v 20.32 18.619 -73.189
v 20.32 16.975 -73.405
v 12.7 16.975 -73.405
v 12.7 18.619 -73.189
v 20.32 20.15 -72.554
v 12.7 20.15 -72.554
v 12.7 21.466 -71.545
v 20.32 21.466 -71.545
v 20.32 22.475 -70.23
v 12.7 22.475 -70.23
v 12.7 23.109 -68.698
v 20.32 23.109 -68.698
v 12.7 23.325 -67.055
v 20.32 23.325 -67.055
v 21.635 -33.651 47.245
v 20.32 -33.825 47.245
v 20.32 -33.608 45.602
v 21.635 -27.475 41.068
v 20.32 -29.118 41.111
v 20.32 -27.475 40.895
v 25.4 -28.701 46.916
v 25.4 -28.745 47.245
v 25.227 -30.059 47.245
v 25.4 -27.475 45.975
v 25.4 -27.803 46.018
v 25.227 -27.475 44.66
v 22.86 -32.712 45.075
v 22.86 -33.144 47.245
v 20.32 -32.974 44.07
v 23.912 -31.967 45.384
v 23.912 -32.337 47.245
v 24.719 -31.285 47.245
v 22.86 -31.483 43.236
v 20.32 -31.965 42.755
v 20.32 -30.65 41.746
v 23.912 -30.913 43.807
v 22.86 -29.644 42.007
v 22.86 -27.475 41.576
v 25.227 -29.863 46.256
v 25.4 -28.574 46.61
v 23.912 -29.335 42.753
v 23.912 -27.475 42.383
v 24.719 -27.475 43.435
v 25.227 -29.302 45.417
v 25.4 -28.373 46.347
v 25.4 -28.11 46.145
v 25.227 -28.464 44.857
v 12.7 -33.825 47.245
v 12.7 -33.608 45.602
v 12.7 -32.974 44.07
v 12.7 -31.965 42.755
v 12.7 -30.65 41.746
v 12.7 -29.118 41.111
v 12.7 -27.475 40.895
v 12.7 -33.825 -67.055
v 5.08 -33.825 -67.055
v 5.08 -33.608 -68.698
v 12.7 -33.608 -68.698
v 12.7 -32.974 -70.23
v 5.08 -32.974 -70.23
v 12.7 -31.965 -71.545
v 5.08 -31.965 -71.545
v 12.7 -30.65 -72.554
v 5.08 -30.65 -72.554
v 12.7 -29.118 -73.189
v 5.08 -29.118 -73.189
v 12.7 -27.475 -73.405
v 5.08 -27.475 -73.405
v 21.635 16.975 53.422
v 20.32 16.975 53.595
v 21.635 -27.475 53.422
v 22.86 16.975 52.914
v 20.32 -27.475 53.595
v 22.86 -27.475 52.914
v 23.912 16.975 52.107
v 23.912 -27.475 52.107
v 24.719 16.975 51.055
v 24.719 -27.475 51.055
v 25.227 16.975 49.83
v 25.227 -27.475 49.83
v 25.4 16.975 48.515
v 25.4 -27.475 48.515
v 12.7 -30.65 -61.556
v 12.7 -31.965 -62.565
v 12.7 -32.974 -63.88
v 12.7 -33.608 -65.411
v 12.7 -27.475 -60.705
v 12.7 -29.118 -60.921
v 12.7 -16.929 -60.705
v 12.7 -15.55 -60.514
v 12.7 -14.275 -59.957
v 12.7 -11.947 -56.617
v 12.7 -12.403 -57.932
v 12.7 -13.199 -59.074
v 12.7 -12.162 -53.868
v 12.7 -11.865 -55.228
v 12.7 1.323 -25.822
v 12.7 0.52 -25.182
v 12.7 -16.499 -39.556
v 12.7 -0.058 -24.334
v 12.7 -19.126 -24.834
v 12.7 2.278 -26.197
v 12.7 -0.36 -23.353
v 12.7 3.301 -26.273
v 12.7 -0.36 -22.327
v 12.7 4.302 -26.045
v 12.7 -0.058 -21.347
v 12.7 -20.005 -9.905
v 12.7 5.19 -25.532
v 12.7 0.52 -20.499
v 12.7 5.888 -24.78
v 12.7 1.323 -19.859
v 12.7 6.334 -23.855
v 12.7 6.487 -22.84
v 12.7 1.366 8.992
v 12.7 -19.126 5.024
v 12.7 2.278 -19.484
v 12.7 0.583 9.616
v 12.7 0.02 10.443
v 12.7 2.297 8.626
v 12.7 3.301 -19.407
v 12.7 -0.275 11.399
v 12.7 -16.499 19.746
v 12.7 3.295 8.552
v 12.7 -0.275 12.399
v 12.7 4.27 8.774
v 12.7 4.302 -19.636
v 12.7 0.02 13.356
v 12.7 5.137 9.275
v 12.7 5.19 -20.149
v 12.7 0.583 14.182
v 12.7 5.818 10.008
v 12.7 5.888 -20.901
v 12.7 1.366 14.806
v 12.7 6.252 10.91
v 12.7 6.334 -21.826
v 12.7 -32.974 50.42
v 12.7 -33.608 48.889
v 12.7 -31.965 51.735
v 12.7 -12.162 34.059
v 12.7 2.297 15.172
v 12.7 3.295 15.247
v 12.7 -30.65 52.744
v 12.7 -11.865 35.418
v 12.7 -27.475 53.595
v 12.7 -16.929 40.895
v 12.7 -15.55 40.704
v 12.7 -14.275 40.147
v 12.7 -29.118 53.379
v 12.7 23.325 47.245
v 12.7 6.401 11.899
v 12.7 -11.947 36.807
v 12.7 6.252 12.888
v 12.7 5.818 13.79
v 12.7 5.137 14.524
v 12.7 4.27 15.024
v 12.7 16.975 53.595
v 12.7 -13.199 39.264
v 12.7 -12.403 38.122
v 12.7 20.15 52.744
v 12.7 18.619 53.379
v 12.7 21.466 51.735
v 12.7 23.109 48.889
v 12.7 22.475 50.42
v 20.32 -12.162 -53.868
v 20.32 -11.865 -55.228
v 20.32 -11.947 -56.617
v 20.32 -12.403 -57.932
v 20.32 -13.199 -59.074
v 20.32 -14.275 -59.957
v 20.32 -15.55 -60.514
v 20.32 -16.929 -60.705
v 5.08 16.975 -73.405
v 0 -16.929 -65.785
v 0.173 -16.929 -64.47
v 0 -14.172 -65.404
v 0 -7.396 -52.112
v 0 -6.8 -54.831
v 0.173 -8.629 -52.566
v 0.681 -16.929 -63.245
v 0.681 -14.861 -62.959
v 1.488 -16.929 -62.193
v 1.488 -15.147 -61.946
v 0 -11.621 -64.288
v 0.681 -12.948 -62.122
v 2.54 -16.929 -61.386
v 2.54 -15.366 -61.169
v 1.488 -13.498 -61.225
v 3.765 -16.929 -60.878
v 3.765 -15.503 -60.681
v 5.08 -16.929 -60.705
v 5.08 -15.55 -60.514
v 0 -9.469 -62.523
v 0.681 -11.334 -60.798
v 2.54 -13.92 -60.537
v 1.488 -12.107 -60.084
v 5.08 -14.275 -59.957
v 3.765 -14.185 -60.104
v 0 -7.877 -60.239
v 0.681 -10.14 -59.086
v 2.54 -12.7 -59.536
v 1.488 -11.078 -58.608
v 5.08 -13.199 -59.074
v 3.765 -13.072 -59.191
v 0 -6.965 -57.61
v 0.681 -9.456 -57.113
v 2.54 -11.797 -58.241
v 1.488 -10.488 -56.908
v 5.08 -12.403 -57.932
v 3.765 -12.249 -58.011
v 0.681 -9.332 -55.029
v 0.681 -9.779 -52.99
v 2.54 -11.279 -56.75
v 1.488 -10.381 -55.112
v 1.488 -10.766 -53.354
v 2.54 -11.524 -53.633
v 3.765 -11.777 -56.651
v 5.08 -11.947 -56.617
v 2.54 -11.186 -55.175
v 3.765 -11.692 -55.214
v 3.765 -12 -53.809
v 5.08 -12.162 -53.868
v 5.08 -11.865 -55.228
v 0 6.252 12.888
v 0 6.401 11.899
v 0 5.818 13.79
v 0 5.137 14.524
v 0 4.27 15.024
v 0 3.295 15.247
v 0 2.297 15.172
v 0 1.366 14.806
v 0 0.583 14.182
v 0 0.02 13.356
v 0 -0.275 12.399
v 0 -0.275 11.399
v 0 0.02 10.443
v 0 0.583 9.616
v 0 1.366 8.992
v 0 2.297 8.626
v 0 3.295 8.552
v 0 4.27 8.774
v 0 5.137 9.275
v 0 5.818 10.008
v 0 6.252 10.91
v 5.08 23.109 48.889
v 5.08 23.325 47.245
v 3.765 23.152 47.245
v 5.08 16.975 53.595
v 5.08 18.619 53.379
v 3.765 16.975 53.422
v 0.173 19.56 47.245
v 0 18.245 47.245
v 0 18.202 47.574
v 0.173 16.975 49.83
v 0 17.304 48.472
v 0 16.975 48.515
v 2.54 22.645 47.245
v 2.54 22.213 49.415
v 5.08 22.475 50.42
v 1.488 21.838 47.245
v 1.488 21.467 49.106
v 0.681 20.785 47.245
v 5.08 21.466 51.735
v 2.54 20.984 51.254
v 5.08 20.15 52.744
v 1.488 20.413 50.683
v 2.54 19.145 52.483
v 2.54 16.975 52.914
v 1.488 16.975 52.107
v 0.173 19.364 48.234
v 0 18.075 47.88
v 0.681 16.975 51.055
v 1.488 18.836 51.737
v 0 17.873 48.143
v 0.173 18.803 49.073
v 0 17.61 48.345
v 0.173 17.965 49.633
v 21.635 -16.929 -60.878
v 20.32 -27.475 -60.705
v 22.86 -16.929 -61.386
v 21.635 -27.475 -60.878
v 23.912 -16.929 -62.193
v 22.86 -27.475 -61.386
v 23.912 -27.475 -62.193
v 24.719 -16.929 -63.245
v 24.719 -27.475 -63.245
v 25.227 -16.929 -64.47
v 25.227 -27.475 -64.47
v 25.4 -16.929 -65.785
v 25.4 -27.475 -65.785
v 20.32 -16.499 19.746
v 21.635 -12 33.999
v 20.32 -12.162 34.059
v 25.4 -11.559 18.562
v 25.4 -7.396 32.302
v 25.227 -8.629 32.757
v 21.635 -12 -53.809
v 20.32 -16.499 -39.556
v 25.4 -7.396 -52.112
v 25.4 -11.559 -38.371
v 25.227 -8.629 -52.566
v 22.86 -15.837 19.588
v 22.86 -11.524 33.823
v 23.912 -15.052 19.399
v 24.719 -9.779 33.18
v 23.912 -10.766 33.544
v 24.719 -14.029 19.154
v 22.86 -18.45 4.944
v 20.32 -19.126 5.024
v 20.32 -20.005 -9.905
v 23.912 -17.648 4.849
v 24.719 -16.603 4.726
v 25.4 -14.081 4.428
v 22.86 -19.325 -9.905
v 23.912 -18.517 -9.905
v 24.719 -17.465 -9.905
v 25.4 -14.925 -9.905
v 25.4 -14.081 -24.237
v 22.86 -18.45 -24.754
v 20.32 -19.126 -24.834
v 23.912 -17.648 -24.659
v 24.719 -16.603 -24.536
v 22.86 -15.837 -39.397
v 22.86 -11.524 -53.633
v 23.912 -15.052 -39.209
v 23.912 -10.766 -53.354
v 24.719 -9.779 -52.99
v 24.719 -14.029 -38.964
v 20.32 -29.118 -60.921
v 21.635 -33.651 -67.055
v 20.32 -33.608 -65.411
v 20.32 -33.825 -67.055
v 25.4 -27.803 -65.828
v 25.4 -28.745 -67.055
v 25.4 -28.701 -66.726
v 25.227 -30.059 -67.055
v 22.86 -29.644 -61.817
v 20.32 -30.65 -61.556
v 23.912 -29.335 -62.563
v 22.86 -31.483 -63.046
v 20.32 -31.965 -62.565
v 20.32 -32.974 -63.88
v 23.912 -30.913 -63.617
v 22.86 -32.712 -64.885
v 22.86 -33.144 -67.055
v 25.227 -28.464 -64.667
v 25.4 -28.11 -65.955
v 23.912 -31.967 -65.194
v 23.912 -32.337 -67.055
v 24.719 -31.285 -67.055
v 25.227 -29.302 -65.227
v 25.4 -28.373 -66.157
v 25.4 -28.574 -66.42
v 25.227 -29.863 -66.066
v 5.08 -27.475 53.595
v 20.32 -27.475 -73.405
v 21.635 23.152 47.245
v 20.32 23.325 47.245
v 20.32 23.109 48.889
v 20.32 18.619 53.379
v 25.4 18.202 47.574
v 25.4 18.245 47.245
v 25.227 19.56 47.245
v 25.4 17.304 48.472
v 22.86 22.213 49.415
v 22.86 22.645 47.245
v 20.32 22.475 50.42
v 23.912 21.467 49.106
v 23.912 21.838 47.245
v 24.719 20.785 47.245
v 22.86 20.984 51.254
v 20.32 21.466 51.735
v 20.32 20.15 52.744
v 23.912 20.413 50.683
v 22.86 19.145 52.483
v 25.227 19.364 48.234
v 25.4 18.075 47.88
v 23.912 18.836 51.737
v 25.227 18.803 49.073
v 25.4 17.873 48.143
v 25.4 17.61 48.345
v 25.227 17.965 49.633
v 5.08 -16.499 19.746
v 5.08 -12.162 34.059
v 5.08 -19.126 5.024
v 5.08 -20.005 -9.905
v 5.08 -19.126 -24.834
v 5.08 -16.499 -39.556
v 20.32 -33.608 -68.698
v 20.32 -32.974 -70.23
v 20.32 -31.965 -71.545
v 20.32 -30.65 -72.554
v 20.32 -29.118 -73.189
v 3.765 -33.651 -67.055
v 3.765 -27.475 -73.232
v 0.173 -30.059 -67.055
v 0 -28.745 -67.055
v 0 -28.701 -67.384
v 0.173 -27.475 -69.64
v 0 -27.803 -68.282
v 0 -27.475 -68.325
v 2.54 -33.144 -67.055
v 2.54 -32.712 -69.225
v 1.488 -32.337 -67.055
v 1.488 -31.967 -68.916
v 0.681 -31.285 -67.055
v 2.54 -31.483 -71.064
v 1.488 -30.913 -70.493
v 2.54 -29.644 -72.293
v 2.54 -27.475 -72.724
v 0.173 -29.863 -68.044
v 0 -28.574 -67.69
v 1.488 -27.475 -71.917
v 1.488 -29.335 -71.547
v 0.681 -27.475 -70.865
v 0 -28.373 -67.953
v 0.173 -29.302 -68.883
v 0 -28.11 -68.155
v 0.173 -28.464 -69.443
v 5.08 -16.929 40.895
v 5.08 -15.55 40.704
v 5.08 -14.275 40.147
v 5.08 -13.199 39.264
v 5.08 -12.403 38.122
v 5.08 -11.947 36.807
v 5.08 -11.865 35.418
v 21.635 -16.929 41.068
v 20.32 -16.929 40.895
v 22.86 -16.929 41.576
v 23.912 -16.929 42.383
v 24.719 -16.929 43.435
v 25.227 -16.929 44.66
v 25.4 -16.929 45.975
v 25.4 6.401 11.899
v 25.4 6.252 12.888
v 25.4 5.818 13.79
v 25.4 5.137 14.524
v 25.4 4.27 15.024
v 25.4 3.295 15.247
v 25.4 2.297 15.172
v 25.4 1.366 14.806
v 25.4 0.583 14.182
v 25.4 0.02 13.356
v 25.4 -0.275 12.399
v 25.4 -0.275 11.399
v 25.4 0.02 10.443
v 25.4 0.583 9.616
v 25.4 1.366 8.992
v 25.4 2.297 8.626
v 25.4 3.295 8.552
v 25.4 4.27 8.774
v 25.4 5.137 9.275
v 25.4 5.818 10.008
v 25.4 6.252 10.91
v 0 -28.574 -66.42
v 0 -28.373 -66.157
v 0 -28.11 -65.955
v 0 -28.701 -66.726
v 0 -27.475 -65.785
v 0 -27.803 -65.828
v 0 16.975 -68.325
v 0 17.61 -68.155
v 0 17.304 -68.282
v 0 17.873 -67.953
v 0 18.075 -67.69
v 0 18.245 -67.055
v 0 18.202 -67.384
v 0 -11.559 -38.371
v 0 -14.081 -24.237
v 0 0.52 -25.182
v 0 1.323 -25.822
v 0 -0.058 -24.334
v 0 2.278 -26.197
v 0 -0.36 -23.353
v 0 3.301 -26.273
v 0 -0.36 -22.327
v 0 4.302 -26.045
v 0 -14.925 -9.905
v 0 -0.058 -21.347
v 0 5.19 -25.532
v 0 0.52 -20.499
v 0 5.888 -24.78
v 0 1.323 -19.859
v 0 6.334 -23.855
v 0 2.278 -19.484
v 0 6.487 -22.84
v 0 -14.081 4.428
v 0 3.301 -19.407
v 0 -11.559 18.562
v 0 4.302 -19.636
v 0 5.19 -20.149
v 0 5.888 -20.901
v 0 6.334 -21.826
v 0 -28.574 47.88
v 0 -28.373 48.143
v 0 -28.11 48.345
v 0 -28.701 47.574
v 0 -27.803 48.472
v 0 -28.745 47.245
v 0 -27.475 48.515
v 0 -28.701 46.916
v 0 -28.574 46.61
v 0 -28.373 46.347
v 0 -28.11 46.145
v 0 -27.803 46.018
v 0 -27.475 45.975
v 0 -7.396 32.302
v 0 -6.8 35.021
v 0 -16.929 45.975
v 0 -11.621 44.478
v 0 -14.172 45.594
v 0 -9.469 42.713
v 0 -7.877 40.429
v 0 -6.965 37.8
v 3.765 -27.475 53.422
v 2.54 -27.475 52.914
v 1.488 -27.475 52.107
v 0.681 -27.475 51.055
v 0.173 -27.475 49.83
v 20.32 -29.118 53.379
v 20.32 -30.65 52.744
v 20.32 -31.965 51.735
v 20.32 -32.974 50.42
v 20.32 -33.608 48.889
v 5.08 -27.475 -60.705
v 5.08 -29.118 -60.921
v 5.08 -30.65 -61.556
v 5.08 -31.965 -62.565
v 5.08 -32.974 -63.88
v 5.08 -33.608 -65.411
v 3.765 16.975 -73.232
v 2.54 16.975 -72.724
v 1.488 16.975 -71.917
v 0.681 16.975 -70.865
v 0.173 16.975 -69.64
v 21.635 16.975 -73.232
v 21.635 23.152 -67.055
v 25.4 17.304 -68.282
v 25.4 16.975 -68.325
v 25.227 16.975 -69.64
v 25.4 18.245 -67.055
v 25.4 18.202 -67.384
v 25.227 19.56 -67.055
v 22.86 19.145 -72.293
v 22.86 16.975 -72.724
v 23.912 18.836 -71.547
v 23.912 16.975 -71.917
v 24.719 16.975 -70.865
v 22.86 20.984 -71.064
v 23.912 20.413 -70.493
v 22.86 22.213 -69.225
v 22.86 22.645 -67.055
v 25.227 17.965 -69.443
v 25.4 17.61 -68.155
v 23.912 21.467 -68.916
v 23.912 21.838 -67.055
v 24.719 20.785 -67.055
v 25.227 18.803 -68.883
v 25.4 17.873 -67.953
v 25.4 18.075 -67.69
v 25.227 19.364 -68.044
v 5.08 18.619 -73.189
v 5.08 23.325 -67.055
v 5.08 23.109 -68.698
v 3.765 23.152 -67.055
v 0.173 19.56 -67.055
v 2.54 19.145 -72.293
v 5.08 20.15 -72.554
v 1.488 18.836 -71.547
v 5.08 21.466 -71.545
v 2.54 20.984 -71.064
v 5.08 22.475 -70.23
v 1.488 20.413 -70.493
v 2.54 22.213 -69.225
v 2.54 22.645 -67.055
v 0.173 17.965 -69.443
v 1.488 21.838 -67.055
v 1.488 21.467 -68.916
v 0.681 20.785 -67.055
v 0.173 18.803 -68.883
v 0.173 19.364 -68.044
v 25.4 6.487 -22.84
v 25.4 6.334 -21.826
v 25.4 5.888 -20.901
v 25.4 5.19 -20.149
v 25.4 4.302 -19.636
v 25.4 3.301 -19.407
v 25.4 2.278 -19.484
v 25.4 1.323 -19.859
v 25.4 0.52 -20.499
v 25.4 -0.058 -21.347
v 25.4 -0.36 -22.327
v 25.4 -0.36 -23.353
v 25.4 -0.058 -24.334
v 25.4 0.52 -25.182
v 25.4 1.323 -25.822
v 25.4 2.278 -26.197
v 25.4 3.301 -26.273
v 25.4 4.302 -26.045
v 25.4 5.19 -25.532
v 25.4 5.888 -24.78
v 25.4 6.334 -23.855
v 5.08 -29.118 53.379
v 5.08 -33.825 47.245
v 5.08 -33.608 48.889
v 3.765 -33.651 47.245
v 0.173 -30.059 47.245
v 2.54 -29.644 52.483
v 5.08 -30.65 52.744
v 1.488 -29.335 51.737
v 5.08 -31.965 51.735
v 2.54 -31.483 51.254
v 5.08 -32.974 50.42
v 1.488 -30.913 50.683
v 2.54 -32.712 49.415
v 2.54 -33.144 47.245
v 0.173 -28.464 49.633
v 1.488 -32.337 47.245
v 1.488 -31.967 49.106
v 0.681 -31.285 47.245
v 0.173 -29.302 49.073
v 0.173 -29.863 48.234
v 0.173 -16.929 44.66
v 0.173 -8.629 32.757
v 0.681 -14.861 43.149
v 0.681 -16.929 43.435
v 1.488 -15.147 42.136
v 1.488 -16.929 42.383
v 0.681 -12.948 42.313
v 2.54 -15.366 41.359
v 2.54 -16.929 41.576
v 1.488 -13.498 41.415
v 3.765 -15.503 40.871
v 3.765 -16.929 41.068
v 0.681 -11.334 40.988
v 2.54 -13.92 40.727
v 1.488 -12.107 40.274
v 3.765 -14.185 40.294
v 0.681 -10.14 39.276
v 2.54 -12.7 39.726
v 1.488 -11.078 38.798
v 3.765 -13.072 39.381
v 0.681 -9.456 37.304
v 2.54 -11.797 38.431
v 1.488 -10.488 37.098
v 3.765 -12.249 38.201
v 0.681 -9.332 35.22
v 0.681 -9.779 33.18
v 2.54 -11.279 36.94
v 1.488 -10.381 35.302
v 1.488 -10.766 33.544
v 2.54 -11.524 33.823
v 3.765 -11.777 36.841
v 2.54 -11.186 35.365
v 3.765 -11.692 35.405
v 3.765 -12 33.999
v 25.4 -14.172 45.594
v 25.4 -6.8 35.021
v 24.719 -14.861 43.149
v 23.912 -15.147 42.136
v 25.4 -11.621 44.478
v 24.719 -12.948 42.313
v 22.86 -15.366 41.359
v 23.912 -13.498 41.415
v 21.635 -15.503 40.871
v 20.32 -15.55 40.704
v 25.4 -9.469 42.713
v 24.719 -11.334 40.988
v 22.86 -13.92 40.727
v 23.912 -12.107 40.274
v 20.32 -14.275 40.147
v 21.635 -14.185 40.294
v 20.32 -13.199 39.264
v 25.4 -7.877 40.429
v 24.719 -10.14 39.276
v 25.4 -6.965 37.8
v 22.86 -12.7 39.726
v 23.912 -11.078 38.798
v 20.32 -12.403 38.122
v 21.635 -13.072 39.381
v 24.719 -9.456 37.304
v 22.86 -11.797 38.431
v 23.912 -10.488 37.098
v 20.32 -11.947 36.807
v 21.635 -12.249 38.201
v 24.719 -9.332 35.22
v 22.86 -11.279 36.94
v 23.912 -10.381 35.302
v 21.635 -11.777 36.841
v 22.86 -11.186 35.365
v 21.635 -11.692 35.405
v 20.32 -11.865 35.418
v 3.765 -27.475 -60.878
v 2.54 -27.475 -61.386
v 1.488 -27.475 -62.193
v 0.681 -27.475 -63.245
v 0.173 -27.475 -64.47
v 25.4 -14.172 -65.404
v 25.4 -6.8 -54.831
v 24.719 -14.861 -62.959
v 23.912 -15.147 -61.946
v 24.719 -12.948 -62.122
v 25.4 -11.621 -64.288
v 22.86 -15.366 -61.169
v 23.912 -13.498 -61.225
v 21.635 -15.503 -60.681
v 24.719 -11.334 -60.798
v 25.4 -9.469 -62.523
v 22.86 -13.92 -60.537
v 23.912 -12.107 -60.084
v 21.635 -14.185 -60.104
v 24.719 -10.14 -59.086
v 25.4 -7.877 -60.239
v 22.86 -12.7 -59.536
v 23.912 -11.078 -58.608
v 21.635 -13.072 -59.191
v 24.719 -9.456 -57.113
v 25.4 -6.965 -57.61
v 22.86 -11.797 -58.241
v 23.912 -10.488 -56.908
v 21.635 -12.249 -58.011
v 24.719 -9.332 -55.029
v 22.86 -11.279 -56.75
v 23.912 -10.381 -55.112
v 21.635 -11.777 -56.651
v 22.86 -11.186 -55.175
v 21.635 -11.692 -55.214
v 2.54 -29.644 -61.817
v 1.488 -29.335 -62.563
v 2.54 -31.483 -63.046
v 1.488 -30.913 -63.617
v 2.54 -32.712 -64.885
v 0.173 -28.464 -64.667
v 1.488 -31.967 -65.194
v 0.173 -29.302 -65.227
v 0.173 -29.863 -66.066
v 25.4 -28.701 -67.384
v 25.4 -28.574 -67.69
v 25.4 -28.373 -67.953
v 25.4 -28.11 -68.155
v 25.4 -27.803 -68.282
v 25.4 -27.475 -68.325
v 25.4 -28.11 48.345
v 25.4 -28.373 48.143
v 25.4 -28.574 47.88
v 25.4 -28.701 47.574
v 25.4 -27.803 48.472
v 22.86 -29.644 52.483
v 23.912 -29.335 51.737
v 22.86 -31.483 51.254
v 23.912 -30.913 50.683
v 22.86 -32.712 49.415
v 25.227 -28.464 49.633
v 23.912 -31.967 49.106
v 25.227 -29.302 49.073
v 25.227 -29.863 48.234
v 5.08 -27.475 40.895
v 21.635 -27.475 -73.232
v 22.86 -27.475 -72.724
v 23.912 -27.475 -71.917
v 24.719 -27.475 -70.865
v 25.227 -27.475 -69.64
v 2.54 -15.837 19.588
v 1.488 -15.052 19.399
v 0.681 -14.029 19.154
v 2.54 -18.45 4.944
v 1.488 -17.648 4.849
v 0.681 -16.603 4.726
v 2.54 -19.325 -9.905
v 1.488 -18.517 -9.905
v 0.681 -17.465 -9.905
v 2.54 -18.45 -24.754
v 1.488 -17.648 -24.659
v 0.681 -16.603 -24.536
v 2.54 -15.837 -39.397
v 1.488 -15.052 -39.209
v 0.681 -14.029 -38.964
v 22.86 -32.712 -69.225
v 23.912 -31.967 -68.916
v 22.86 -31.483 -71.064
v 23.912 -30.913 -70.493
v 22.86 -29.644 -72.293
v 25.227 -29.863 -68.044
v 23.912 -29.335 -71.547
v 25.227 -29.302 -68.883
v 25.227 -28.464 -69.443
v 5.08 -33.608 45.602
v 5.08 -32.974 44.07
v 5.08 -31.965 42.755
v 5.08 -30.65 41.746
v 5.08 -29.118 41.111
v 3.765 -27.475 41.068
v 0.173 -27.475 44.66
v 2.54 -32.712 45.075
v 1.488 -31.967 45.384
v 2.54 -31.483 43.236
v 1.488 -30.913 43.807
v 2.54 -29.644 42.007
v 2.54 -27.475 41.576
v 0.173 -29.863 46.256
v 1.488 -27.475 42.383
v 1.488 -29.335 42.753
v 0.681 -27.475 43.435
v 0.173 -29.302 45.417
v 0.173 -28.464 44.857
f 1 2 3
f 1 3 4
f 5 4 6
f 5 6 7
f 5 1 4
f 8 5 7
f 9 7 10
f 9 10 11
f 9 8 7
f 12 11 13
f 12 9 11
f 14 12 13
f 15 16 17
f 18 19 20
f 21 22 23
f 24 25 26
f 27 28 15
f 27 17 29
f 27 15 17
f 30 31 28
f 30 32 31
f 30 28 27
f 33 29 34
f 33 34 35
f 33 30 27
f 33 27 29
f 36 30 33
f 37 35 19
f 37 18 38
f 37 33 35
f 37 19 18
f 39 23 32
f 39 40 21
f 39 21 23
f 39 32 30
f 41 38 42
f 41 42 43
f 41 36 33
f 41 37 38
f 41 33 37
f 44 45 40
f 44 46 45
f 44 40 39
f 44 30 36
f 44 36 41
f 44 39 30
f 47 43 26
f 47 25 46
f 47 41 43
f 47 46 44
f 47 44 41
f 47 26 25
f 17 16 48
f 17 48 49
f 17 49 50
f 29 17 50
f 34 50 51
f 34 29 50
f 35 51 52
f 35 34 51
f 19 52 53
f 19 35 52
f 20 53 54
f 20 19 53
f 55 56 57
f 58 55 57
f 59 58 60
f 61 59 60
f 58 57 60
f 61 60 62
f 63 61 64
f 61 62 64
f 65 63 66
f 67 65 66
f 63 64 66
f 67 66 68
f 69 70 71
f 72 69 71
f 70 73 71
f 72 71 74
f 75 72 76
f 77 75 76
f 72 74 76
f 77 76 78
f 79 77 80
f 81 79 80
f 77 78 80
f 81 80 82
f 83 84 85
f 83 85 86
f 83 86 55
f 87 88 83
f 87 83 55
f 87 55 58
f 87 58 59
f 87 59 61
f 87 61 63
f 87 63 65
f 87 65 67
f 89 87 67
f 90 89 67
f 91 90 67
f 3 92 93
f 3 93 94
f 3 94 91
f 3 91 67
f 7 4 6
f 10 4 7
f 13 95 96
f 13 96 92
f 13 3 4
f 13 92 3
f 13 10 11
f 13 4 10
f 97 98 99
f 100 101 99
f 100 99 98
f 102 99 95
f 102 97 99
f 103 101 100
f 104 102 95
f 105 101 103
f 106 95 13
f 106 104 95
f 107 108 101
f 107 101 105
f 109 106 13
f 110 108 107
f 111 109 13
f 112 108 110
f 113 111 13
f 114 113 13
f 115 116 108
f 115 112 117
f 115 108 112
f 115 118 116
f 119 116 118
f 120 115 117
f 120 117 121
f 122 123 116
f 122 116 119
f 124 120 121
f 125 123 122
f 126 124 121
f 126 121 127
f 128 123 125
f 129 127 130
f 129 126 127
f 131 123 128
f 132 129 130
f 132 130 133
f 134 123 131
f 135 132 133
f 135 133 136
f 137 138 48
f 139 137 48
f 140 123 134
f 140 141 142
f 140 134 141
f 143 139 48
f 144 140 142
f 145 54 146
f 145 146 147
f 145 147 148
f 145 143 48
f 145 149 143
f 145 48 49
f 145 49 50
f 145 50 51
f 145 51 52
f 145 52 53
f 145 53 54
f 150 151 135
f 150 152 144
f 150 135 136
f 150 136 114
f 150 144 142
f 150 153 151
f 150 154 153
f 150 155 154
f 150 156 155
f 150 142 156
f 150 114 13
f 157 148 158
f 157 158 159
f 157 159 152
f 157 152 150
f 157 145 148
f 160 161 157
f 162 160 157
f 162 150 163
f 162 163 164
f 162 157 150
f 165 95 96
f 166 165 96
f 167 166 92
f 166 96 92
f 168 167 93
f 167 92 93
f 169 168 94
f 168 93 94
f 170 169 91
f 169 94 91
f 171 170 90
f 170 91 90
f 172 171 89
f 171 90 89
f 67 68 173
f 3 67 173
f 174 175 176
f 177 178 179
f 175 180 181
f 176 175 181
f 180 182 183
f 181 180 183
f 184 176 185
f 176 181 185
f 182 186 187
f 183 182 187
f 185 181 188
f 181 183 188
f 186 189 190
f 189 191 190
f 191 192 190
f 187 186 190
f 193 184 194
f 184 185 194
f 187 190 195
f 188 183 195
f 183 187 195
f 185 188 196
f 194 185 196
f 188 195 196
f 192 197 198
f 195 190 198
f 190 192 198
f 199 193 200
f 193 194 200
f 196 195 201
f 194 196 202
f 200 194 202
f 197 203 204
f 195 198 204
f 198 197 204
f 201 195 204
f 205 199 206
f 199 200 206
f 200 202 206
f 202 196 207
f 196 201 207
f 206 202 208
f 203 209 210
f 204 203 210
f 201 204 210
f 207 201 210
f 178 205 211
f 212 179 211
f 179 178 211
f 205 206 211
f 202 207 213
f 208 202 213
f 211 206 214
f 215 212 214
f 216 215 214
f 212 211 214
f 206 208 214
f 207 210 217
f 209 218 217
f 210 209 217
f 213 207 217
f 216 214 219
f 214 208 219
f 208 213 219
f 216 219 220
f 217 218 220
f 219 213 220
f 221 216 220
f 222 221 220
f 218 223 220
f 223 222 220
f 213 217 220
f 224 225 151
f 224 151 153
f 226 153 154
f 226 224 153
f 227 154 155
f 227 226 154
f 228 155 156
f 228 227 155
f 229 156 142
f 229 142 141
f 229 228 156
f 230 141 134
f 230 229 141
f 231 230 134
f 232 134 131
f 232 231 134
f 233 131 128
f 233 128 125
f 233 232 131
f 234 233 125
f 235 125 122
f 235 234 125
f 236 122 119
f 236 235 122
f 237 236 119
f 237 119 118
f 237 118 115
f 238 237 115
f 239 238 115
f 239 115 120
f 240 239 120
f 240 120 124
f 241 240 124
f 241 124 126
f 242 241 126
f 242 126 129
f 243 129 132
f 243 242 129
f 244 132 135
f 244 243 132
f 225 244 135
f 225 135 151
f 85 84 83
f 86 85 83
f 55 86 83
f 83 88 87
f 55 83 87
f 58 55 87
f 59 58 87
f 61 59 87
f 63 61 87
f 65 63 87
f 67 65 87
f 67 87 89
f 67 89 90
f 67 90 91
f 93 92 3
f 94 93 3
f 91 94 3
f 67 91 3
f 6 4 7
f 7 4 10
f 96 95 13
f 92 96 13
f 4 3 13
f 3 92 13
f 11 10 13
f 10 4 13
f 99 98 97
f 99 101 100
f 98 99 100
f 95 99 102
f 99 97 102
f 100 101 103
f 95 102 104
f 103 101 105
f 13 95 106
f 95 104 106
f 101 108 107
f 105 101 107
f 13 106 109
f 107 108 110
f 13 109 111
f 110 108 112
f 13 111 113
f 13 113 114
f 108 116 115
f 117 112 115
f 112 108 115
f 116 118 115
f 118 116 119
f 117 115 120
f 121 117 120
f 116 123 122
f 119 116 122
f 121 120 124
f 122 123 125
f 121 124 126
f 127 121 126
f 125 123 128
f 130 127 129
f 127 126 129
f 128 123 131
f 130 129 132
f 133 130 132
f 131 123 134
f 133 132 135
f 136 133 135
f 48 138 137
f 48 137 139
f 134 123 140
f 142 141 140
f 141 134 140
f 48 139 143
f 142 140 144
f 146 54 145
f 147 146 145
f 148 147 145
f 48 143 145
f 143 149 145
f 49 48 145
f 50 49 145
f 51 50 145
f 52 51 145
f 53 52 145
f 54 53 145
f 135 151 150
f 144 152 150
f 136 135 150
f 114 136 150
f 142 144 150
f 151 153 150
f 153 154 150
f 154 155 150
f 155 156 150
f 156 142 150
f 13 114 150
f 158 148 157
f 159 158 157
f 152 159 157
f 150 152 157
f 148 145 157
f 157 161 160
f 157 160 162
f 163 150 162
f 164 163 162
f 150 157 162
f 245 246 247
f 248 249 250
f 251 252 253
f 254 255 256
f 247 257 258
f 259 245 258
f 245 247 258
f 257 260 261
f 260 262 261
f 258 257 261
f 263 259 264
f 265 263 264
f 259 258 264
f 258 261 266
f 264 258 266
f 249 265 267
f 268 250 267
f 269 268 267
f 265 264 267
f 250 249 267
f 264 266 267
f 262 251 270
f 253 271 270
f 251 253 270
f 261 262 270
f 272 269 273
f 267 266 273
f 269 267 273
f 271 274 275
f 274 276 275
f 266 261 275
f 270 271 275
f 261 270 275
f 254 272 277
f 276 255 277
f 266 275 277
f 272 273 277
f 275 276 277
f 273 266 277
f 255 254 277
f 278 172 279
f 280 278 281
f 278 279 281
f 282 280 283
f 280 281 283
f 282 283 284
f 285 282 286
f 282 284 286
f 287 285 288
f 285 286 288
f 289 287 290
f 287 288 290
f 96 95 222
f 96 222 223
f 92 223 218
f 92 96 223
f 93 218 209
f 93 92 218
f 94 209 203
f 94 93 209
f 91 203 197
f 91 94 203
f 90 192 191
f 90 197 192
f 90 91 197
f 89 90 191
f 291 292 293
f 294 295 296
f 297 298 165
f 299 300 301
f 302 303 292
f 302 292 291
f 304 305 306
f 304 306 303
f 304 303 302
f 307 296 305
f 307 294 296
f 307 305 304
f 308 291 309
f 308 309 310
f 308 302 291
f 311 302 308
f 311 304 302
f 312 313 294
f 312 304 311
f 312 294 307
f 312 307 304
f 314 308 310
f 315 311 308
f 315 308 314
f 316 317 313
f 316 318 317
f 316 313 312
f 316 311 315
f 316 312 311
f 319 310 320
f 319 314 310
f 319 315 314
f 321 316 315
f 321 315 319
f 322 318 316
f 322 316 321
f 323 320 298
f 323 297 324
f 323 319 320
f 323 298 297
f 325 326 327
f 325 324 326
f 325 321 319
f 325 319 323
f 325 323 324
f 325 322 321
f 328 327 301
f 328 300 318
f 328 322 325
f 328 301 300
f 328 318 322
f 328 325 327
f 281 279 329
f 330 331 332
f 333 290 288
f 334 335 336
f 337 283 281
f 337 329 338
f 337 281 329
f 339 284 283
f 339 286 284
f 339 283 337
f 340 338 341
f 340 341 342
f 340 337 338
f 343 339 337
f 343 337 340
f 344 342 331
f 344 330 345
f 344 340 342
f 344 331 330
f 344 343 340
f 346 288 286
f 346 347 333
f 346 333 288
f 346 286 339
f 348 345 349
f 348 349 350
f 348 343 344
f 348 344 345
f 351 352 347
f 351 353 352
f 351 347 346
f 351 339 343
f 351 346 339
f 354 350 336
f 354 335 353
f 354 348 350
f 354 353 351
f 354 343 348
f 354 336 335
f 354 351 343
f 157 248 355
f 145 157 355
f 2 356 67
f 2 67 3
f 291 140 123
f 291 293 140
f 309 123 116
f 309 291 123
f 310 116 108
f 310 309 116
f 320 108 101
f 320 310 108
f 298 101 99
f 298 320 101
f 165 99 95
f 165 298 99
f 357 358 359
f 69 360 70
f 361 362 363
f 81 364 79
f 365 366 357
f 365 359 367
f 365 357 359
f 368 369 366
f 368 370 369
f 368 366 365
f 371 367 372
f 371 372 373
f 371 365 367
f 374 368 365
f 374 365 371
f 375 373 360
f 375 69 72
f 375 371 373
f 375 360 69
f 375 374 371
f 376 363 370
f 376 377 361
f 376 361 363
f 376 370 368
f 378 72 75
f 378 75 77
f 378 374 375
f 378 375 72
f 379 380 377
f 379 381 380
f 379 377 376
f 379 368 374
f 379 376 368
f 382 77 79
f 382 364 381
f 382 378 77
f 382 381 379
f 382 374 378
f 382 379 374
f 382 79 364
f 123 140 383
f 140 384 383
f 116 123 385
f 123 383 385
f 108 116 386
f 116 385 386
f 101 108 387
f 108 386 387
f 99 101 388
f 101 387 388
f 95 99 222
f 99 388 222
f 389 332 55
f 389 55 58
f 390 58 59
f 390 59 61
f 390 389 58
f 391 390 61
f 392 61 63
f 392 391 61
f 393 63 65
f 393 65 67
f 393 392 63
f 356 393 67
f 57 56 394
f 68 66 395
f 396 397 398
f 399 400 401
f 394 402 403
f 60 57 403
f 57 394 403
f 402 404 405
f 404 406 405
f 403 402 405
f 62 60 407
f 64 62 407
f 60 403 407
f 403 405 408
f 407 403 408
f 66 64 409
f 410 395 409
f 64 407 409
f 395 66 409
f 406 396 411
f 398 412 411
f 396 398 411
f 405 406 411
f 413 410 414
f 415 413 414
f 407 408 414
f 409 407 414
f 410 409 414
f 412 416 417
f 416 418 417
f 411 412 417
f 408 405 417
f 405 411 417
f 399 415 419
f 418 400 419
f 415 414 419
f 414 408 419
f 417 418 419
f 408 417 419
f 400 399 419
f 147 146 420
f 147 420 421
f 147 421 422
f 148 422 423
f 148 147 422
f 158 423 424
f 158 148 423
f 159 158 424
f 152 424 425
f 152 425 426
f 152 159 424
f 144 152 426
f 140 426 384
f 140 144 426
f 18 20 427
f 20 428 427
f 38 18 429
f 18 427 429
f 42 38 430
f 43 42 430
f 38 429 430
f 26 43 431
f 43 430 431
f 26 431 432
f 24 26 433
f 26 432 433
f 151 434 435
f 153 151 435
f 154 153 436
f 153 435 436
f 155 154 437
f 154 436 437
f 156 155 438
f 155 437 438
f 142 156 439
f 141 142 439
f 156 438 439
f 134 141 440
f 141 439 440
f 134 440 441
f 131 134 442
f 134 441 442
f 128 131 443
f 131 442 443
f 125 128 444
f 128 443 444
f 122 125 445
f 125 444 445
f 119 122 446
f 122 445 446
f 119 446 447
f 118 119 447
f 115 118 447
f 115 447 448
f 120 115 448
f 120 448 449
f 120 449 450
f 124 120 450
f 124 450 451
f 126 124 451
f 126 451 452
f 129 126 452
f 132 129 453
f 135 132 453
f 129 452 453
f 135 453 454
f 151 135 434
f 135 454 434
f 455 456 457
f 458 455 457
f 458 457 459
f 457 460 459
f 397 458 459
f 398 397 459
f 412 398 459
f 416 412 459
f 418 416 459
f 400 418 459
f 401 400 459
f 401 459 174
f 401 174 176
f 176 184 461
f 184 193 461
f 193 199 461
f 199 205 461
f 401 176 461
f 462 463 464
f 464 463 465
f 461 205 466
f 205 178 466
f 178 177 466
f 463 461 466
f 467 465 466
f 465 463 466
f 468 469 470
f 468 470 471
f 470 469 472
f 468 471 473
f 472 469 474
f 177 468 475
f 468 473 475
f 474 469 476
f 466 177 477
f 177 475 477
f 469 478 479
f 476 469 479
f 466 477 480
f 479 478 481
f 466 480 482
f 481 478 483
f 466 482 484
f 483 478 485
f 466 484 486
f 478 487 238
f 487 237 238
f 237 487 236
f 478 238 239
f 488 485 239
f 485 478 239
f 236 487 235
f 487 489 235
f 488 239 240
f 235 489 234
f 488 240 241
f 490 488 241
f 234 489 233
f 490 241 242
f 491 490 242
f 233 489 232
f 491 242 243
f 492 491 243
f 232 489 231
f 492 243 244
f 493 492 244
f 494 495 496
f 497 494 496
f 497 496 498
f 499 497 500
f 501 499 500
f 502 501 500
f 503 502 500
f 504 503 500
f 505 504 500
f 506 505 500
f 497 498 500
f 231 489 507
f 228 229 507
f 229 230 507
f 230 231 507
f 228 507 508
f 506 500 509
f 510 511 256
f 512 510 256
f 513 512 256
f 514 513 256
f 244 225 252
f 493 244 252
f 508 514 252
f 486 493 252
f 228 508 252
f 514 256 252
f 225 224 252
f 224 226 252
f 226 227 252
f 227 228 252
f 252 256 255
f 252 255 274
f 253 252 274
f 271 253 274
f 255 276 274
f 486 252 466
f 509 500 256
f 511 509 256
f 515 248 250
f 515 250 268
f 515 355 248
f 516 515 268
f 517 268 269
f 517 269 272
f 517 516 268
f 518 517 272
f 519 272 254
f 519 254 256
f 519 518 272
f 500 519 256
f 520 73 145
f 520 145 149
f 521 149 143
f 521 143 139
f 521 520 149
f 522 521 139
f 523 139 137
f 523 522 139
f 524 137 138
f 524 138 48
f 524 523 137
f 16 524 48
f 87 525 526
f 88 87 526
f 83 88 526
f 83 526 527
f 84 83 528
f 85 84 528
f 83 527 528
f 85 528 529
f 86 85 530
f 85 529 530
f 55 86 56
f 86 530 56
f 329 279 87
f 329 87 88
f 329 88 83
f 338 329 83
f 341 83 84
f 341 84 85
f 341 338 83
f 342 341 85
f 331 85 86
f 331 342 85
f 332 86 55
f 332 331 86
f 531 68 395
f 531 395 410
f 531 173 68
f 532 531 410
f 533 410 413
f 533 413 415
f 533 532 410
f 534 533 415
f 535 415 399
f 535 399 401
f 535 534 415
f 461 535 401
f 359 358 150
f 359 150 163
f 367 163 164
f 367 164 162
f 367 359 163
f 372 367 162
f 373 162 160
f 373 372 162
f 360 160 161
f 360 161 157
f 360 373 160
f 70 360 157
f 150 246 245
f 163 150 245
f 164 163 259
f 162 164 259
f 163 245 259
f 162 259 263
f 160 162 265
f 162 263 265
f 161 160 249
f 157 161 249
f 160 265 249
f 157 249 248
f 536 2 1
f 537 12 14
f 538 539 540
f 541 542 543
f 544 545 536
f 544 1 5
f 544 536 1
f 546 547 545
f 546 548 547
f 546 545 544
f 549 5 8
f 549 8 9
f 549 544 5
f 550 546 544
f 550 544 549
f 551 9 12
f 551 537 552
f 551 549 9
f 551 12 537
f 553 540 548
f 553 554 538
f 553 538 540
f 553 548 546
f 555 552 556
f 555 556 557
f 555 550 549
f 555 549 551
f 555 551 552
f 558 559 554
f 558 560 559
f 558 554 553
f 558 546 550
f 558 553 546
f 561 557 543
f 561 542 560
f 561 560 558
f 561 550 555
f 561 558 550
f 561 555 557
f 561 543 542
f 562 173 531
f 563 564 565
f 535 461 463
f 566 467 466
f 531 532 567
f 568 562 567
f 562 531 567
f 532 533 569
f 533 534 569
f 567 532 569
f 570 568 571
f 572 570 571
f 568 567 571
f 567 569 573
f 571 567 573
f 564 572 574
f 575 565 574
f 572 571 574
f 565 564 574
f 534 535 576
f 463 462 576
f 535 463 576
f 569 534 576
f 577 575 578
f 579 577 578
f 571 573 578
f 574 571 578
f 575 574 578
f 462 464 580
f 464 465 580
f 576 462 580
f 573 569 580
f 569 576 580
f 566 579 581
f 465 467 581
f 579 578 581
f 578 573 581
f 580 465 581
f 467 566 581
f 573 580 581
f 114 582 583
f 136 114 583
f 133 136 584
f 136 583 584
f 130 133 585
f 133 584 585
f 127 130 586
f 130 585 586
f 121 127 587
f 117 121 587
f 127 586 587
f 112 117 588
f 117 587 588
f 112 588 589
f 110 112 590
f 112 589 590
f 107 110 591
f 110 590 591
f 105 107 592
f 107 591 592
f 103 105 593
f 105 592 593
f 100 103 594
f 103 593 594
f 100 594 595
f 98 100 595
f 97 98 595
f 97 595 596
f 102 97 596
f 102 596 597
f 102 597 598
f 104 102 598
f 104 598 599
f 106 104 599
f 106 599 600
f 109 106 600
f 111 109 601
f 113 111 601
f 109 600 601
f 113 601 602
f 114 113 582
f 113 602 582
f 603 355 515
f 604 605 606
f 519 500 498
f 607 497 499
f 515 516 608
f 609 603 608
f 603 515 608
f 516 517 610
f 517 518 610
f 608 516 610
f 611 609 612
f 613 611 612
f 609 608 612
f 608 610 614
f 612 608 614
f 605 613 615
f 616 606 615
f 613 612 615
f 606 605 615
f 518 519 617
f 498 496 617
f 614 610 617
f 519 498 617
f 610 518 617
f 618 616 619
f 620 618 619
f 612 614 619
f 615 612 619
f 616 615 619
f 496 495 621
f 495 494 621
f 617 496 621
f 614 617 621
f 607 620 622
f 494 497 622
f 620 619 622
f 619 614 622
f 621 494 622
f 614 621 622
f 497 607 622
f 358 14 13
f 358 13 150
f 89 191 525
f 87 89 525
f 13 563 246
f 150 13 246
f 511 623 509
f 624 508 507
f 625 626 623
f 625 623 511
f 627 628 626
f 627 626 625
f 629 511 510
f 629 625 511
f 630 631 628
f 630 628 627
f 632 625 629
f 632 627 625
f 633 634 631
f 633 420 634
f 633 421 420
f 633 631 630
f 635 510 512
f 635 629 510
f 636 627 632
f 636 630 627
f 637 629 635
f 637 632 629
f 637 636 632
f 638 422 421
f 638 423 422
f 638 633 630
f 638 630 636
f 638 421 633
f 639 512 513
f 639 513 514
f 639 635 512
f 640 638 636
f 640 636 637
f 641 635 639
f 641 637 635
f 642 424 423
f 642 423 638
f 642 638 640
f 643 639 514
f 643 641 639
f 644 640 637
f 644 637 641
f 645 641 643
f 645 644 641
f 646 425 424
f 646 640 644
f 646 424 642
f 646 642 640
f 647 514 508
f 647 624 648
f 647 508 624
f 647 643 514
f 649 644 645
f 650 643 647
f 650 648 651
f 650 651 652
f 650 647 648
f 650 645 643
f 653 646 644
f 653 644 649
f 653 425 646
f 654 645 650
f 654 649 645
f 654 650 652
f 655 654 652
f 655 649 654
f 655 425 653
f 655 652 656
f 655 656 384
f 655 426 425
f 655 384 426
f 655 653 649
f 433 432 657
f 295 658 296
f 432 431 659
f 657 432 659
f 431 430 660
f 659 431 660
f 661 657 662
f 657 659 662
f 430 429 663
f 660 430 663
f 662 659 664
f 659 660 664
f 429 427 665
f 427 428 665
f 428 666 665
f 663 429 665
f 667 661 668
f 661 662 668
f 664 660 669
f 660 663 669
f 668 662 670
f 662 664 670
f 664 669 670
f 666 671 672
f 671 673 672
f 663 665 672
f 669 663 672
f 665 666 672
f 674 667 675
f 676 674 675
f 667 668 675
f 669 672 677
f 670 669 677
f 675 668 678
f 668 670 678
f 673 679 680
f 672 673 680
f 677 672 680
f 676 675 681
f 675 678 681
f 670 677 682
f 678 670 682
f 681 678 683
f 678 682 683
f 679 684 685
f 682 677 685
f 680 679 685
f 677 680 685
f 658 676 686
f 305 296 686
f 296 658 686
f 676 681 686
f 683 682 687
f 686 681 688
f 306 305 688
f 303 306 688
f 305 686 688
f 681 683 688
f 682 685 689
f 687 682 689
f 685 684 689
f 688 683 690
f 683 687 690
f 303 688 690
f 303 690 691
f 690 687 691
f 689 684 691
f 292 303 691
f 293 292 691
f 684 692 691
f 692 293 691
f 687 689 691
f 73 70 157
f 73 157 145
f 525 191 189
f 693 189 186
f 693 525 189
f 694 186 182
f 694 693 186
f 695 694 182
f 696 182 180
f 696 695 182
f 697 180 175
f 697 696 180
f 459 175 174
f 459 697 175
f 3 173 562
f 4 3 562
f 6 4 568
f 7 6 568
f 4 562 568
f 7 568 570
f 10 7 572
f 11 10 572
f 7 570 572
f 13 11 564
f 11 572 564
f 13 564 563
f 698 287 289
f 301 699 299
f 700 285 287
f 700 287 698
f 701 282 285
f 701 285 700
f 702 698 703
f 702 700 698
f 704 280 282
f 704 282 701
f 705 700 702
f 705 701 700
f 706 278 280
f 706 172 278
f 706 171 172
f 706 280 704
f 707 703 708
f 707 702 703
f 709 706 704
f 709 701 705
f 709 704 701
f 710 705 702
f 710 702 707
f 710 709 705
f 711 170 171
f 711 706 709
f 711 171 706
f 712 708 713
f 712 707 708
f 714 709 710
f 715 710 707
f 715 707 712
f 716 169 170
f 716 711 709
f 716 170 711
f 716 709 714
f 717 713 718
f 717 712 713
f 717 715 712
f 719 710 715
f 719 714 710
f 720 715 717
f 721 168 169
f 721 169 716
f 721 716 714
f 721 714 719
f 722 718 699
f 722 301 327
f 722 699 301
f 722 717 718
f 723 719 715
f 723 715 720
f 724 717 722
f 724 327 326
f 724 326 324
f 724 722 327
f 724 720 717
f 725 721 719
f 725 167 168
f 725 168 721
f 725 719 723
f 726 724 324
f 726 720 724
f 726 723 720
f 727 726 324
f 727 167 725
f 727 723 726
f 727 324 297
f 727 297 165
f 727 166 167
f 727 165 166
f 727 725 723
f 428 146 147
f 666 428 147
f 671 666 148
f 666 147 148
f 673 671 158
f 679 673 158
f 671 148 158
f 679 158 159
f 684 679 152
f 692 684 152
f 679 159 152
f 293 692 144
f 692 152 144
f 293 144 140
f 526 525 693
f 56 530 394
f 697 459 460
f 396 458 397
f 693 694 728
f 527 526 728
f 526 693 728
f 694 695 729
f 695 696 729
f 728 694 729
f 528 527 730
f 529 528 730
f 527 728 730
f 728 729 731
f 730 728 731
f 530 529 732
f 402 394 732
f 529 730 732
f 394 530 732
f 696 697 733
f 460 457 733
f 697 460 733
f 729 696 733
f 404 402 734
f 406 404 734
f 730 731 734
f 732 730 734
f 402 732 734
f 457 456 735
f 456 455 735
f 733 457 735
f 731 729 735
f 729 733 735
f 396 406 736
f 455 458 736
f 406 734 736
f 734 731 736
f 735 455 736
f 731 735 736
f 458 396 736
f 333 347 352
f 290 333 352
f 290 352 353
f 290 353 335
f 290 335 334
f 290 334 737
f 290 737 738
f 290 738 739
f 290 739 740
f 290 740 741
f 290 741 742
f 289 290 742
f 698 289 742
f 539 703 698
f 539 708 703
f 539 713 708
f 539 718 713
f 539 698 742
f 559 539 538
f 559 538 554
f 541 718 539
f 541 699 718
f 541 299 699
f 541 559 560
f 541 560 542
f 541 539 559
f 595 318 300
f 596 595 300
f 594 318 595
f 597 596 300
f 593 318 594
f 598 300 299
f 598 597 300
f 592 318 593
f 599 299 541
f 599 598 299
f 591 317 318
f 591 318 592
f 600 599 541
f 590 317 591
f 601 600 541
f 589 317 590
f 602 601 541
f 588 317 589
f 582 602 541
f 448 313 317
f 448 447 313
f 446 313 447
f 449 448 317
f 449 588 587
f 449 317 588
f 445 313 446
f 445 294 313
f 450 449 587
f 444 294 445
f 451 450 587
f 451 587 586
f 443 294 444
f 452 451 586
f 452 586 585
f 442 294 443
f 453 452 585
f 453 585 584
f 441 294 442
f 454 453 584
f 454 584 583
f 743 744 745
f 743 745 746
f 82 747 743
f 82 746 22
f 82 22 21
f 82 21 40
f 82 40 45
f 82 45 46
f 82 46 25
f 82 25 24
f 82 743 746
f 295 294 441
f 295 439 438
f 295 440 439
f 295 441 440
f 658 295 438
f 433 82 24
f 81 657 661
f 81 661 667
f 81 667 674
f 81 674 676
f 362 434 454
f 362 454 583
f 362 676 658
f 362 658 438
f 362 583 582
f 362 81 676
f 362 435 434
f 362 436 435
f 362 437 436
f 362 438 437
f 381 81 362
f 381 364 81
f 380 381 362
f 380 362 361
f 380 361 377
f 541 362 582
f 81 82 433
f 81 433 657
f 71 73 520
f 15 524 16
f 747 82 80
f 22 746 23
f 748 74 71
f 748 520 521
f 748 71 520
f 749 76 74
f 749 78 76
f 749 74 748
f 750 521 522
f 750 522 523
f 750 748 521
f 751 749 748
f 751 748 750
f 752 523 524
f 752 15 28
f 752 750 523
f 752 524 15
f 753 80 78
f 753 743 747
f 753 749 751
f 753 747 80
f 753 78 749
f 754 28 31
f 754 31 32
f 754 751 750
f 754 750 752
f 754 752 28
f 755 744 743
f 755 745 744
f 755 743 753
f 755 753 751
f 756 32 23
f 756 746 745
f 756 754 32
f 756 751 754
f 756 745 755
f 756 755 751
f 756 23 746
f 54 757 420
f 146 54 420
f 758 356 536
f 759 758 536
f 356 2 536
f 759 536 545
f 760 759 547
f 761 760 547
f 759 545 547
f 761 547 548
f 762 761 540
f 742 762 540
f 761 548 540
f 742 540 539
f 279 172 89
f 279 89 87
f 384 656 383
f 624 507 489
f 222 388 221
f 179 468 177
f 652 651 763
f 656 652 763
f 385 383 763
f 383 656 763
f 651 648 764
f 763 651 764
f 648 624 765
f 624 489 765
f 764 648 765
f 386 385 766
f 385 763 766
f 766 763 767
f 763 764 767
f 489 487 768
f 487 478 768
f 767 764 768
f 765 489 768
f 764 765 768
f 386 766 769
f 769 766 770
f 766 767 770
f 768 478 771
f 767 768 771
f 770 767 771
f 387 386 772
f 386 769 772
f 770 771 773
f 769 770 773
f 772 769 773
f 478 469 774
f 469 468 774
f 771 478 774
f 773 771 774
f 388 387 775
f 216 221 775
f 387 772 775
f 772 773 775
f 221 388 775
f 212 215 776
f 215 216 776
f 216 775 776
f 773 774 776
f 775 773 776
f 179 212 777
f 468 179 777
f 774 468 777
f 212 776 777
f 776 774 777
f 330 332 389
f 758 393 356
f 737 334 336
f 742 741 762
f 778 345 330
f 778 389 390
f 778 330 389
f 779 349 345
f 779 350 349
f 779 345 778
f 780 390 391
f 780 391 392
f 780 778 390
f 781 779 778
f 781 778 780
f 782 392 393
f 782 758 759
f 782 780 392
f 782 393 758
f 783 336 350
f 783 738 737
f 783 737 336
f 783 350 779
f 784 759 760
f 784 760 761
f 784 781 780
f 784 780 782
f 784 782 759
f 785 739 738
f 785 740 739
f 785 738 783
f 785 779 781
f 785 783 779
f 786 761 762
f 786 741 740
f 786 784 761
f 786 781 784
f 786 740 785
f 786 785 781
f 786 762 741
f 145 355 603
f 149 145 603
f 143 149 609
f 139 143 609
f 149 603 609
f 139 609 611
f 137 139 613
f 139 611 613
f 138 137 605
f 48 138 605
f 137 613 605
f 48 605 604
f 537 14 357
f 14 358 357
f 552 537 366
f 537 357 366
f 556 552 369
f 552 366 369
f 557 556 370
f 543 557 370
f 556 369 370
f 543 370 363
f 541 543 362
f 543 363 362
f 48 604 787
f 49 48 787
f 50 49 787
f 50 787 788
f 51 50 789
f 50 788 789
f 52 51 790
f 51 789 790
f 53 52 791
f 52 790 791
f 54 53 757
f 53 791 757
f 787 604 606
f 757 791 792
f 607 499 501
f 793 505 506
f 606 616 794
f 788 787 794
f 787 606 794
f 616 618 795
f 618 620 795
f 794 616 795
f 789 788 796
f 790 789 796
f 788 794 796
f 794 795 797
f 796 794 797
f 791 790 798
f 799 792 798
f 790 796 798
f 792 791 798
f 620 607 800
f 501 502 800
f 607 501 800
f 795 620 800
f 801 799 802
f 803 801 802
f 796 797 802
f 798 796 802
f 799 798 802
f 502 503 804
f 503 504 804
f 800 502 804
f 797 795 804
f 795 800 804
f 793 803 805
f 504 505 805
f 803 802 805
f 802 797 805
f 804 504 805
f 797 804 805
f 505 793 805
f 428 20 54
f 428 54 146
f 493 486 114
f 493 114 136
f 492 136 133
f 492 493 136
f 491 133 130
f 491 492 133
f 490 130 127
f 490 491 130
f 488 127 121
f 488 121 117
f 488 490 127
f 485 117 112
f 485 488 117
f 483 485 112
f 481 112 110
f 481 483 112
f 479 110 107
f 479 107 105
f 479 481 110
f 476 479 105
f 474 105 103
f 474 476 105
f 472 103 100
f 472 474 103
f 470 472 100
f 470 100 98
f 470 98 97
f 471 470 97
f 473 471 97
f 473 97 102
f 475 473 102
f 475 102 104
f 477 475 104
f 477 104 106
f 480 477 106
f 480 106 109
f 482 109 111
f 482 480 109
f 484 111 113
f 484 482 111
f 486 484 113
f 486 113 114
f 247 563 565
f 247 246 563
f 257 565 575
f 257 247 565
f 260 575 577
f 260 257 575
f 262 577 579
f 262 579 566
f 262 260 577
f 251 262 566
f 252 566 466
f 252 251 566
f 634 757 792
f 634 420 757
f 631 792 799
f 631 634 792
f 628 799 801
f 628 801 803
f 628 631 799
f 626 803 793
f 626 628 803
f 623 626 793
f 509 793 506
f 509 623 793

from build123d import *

# Parameters (mm, degrees)
F0_R     = 3.442574
F0_R_2   = 3.35685
F1_DEPTH = 12.7
F2_R     = 5.08


with BuildPart() as f1:
    # F0 (on Right) → F1 (new body)
    with BuildSketch(Plane.YZ):
        with BuildLine():
            Line((23.325471, -67.054919), (23.325471, 47.245081))
            ThreePointArc((23.325471, 47.245081), (21.465599, 51.73521), (16.975471, 53.595081))
            Line((16.975471, 53.595081), (-27.474529, 53.595081))
            ThreePointArc((-27.474529, 53.595081), (-31.964657, 51.73521), (-33.824529, 47.245081))
            ThreePointArc((-33.824529, 47.245081), (-31.964657, 42.754953), (-27.474529, 40.895081))
            Line((-27.474529, 40.895081), (-9.415587, 40.895081))
            Line((-9.415587, 40.895081), (-9.415587, -60.704919))
            Line((-9.415587, -60.704919), (-27.474529, -60.704919))
            ThreePointArc((-27.474529, -60.704919), (-31.964657, -62.56479), (-33.824529, -67.054919))
            ThreePointArc((-33.824529, -67.054919), (-31.964657, -71.545047), (-27.474529, -73.404919))
            Line((-27.474529, -73.404919), (16.975471, -73.404919))
            ThreePointArc((16.975471, -73.404919), (21.465599, -71.545047), (23.325471, -67.054919))
        make_face()
        with Locations((3.043987, -22.84038)):
            Circle(F0_R, mode=Mode.SUBTRACT)
        with Locations((3.043987, 11.899044)):
            Circle(F0_R_2, mode=Mode.SUBTRACT)
        with BuildLine():
            Line((-9.415587, -60.704919), (-9.415587, 40.895081))
            ThreePointArc((-9.415587, 40.895081), (-20.005104, -9.904919), (-9.415587, -60.704919))
        make_face()
    extrude(amount=F1_DEPTH)

    # F2
    f2_edges = [f1.edges().sort_by_distance(p)[0] for p in [
        (0, -5.249529, 53.595081),
        (0, -20.005104, -9.904919),
        (6.35, -9.415587, 40.895081),
        (6.35, -9.415587, -60.704919),
    ]]
    fillet(f2_edges, radius=F2_R)


with BuildPart() as f3_1:
    # F3: instance of F1
    add(f1.part.mirror(Plane(origin=(12.7, 1.082307, -9.958647), x_dir=(0, 1, 0), z_dir=(1, 0, 0))))


solid = Compound([f1.part, f3_1.part])
